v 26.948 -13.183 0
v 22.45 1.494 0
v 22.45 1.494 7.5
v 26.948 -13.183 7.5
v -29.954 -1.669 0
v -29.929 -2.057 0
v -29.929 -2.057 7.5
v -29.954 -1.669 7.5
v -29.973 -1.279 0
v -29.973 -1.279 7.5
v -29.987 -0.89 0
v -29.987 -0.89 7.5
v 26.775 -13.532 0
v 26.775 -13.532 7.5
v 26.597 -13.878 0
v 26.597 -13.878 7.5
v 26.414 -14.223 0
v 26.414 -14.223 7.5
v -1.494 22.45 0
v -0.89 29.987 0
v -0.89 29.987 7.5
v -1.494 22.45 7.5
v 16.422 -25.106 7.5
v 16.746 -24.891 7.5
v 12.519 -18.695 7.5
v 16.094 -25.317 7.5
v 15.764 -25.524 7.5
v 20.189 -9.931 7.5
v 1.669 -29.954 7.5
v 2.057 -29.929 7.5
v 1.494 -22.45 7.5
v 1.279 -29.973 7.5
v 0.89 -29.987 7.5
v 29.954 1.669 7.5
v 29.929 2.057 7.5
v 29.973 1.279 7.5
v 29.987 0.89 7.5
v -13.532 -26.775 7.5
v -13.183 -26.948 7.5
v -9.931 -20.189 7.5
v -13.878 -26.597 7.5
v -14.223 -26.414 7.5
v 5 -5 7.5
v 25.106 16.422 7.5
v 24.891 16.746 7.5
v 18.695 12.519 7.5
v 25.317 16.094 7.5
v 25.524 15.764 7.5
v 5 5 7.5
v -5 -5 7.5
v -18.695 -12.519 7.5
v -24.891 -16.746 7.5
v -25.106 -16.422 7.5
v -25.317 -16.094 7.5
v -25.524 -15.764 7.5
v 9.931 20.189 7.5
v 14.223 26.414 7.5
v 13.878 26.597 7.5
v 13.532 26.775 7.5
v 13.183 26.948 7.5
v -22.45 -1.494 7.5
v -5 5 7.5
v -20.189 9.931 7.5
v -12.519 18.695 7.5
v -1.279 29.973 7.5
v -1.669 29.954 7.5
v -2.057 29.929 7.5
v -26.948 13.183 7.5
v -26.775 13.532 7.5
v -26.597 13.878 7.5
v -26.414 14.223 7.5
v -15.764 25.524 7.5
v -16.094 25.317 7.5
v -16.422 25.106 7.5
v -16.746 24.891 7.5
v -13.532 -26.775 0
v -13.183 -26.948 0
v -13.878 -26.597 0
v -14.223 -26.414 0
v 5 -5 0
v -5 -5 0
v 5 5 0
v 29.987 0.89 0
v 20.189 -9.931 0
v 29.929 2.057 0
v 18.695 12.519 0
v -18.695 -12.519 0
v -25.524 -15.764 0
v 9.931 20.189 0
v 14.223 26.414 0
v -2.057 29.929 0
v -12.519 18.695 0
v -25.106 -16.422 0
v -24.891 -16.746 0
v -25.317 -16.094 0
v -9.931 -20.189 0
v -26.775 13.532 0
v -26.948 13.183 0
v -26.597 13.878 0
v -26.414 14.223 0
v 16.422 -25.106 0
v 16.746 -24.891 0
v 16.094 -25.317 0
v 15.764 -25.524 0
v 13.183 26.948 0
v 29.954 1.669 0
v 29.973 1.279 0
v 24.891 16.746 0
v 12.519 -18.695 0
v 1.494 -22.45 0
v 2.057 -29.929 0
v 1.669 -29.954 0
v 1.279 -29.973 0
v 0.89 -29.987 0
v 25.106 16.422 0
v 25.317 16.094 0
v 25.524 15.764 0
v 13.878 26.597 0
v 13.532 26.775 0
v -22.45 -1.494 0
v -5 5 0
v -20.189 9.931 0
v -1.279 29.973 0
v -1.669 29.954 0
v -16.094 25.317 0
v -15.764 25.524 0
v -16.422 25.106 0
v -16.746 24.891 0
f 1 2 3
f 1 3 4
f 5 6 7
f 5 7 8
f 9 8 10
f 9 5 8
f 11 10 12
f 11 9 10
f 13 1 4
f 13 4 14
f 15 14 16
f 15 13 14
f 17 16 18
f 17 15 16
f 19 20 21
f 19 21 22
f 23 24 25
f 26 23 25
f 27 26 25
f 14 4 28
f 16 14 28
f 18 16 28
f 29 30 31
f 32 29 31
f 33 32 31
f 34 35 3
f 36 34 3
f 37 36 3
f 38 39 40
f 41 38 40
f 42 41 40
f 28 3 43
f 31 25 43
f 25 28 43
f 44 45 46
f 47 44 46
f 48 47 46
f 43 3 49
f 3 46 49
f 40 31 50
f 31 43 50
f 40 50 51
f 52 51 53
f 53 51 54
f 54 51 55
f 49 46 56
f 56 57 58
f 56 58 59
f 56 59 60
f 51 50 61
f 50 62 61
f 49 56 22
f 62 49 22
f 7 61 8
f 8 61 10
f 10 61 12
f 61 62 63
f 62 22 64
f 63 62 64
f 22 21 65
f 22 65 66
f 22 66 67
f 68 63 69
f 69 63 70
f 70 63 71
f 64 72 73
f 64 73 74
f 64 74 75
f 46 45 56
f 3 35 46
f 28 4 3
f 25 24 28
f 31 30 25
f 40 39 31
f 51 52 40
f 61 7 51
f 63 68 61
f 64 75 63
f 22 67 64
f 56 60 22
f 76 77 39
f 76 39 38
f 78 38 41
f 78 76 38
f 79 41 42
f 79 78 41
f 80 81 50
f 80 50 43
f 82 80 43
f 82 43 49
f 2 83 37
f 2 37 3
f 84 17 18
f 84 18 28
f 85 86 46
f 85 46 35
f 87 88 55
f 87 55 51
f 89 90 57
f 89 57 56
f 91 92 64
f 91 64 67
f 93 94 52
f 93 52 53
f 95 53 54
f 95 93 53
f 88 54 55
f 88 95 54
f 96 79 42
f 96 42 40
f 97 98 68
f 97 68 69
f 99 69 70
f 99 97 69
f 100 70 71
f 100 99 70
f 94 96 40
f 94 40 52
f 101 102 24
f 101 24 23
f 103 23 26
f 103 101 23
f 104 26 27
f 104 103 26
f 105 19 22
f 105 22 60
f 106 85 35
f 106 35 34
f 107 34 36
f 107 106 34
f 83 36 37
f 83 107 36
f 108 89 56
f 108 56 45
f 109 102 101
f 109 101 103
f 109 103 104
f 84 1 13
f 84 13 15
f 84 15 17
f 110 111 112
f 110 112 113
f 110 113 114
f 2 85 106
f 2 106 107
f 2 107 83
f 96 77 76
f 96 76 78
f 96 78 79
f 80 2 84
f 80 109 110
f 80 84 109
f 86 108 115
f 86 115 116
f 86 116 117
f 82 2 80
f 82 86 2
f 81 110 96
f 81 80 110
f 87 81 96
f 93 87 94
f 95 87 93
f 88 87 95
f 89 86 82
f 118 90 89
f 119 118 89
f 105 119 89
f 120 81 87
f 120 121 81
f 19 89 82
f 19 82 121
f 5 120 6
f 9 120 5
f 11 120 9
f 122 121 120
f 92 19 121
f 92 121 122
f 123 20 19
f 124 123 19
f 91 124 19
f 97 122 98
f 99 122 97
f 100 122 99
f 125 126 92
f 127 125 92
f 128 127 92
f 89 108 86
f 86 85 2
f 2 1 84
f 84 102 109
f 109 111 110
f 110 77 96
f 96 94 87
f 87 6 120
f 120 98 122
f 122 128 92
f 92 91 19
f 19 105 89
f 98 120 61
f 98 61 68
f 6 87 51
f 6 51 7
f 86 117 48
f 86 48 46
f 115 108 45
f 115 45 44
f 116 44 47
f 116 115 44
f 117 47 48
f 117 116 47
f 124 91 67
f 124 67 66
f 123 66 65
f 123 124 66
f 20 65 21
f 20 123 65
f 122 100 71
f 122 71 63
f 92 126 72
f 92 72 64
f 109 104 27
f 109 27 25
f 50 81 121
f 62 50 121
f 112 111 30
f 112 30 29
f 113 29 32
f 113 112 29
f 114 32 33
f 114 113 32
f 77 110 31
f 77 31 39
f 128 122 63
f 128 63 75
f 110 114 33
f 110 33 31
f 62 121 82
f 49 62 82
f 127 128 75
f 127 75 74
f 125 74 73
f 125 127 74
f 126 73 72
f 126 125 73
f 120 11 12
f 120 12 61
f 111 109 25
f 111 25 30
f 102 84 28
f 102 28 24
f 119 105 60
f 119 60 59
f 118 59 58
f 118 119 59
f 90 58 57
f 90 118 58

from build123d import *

# Parameters (mm, degrees)
SKETCH1_W           = 10
SKETCH1_H           = 10
BOSS_EXTRUDE1_DEPTH = 7.5


with BuildPart() as part:
    # Sketch1 → Boss-Extrude1 (new body)
    with BuildSketch(Plane.XY):
        with BuildLine():
            Line((9.931375967, 20.189144499), (24.890876528, 16.746470245))
            ThreePointArc((24.890876528, 16.746470245), (25.212386049, 16.25840059), (25.524326618, 15.764160323))
            Line((25.524326618, 15.764160323), (18.695396131, 12.518624033))
            Line((18.695396131, 12.518624033), (29.929366518, 2.057430392))
            ThreePointArc((29.929366518, 2.057430392), (29.963767103, 1.473994911), (29.986795427, 0.89))
            Line((29.986795427, 0.89), (22.45, 1.493748368))
            Line((22.45, 1.493748368), (26.94830692, -13.182896273))
            ThreePointArc((26.94830692, -13.182896273), (26.68638096, -13.705366513), (26.414326618, -14.222635104))
            Line((26.414326618, -14.222635104), (20.189144499, -9.931375967))
            Line((20.189144499, -9.931375967), (16.746470245, -24.890876528))
            ThreePointArc((16.746470245, -24.890876528), (16.25840059, -25.212386049), (15.764160323, -25.524326618))
            Line((15.764160323, -25.524326618), (12.518624033, -18.695396131))
            Line((12.518624033, -18.695396131), (2.057430392, -29.929366518))
            ThreePointArc((2.057430392, -29.929366518), (1.473994911, -29.963767103), (0.89, -29.986795427))
            Line((0.89, -29.986795427), (1.493748368, -22.45))
            Line((1.493748368, -22.45), (-13.182896273, -26.94830692))
            ThreePointArc((-13.182896273, -26.94830692), (-13.705366513, -26.68638096), (-14.222635104, -26.414326618))
            Line((-14.222635104, -26.414326618), (-9.931375967, -20.189144499))
            Line((-9.931375967, -20.189144499), (-24.890876528, -16.746470245))
            ThreePointArc((-24.890876528, -16.746470245), (-25.212386049, -16.25840059), (-25.524326618, -15.764160323))
            Line((-25.524326618, -15.764160323), (-18.695396131, -12.518624033))
            Line((-18.695396131, -12.518624033), (-29.929366518, -2.057430392))
            ThreePointArc((-29.929366518, -2.057430392), (-29.963767103, -1.473994911), (-29.986795427, -0.89))
            Line((-29.986795427, -0.89), (-22.45, -1.493748368))
            Line((-22.45, -1.493748368), (-26.94830692, 13.182896273))
            ThreePointArc((-26.94830692, 13.182896273), (-26.68638096, 13.705366513), (-26.414326618, 14.222635104))
            Line((-26.414326618, 14.222635104), (-20.189144499, 9.931375967))
            Line((-20.189144499, 9.931375967), (-16.746470245, 24.890876528))
            ThreePointArc((-16.746470245, 24.890876528), (-16.25840059, 25.212386049), (-15.764160323, 25.524326618))
            Line((-15.764160323, 25.524326618), (-12.518624033, 18.695396131))
            Line((-12.518624033, 18.695396131), (-2.057430392, 29.929366518))
            ThreePointArc((-2.057430392, 29.929366518), (-1.473994911, 29.963767103), (-0.89, 29.986795427))
            Line((-0.89, 29.986795427), (-1.493748368, 22.45))
            Line((-1.493748368, 22.45), (13.182896273, 26.94830692))
            ThreePointArc((13.182896273, 26.94830692), (13.705366513, 26.68638096), (14.222635104, 26.414326618))
            Line((14.222635104, 26.414326618), (9.931375967, 20.189144499))
        make_face()
        Rectangle(SKETCH1_W, SKETCH1_H, mode=Mode.SUBTRACT)
    extrude(amount=BOSS_EXTRUDE1_DEPTH)


solid = part.part
